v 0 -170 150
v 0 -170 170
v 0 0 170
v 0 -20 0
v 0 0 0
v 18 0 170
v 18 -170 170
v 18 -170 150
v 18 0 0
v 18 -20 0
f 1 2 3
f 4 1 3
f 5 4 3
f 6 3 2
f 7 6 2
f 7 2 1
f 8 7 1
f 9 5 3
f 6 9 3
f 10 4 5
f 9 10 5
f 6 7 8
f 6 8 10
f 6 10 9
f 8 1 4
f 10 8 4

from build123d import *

# Parameters (mm, degrees)
PAD_DEPTH = 18


with BuildPart() as part:
    # Sketch → Pad (new body)
    with BuildSketch(Plane.YZ):
        Polygon((0, 170), (-170, 170), (-170, 150), (-20, 0), (0, 0), align=None)
    extrude(amount=PAD_DEPTH)


solid = part.part
